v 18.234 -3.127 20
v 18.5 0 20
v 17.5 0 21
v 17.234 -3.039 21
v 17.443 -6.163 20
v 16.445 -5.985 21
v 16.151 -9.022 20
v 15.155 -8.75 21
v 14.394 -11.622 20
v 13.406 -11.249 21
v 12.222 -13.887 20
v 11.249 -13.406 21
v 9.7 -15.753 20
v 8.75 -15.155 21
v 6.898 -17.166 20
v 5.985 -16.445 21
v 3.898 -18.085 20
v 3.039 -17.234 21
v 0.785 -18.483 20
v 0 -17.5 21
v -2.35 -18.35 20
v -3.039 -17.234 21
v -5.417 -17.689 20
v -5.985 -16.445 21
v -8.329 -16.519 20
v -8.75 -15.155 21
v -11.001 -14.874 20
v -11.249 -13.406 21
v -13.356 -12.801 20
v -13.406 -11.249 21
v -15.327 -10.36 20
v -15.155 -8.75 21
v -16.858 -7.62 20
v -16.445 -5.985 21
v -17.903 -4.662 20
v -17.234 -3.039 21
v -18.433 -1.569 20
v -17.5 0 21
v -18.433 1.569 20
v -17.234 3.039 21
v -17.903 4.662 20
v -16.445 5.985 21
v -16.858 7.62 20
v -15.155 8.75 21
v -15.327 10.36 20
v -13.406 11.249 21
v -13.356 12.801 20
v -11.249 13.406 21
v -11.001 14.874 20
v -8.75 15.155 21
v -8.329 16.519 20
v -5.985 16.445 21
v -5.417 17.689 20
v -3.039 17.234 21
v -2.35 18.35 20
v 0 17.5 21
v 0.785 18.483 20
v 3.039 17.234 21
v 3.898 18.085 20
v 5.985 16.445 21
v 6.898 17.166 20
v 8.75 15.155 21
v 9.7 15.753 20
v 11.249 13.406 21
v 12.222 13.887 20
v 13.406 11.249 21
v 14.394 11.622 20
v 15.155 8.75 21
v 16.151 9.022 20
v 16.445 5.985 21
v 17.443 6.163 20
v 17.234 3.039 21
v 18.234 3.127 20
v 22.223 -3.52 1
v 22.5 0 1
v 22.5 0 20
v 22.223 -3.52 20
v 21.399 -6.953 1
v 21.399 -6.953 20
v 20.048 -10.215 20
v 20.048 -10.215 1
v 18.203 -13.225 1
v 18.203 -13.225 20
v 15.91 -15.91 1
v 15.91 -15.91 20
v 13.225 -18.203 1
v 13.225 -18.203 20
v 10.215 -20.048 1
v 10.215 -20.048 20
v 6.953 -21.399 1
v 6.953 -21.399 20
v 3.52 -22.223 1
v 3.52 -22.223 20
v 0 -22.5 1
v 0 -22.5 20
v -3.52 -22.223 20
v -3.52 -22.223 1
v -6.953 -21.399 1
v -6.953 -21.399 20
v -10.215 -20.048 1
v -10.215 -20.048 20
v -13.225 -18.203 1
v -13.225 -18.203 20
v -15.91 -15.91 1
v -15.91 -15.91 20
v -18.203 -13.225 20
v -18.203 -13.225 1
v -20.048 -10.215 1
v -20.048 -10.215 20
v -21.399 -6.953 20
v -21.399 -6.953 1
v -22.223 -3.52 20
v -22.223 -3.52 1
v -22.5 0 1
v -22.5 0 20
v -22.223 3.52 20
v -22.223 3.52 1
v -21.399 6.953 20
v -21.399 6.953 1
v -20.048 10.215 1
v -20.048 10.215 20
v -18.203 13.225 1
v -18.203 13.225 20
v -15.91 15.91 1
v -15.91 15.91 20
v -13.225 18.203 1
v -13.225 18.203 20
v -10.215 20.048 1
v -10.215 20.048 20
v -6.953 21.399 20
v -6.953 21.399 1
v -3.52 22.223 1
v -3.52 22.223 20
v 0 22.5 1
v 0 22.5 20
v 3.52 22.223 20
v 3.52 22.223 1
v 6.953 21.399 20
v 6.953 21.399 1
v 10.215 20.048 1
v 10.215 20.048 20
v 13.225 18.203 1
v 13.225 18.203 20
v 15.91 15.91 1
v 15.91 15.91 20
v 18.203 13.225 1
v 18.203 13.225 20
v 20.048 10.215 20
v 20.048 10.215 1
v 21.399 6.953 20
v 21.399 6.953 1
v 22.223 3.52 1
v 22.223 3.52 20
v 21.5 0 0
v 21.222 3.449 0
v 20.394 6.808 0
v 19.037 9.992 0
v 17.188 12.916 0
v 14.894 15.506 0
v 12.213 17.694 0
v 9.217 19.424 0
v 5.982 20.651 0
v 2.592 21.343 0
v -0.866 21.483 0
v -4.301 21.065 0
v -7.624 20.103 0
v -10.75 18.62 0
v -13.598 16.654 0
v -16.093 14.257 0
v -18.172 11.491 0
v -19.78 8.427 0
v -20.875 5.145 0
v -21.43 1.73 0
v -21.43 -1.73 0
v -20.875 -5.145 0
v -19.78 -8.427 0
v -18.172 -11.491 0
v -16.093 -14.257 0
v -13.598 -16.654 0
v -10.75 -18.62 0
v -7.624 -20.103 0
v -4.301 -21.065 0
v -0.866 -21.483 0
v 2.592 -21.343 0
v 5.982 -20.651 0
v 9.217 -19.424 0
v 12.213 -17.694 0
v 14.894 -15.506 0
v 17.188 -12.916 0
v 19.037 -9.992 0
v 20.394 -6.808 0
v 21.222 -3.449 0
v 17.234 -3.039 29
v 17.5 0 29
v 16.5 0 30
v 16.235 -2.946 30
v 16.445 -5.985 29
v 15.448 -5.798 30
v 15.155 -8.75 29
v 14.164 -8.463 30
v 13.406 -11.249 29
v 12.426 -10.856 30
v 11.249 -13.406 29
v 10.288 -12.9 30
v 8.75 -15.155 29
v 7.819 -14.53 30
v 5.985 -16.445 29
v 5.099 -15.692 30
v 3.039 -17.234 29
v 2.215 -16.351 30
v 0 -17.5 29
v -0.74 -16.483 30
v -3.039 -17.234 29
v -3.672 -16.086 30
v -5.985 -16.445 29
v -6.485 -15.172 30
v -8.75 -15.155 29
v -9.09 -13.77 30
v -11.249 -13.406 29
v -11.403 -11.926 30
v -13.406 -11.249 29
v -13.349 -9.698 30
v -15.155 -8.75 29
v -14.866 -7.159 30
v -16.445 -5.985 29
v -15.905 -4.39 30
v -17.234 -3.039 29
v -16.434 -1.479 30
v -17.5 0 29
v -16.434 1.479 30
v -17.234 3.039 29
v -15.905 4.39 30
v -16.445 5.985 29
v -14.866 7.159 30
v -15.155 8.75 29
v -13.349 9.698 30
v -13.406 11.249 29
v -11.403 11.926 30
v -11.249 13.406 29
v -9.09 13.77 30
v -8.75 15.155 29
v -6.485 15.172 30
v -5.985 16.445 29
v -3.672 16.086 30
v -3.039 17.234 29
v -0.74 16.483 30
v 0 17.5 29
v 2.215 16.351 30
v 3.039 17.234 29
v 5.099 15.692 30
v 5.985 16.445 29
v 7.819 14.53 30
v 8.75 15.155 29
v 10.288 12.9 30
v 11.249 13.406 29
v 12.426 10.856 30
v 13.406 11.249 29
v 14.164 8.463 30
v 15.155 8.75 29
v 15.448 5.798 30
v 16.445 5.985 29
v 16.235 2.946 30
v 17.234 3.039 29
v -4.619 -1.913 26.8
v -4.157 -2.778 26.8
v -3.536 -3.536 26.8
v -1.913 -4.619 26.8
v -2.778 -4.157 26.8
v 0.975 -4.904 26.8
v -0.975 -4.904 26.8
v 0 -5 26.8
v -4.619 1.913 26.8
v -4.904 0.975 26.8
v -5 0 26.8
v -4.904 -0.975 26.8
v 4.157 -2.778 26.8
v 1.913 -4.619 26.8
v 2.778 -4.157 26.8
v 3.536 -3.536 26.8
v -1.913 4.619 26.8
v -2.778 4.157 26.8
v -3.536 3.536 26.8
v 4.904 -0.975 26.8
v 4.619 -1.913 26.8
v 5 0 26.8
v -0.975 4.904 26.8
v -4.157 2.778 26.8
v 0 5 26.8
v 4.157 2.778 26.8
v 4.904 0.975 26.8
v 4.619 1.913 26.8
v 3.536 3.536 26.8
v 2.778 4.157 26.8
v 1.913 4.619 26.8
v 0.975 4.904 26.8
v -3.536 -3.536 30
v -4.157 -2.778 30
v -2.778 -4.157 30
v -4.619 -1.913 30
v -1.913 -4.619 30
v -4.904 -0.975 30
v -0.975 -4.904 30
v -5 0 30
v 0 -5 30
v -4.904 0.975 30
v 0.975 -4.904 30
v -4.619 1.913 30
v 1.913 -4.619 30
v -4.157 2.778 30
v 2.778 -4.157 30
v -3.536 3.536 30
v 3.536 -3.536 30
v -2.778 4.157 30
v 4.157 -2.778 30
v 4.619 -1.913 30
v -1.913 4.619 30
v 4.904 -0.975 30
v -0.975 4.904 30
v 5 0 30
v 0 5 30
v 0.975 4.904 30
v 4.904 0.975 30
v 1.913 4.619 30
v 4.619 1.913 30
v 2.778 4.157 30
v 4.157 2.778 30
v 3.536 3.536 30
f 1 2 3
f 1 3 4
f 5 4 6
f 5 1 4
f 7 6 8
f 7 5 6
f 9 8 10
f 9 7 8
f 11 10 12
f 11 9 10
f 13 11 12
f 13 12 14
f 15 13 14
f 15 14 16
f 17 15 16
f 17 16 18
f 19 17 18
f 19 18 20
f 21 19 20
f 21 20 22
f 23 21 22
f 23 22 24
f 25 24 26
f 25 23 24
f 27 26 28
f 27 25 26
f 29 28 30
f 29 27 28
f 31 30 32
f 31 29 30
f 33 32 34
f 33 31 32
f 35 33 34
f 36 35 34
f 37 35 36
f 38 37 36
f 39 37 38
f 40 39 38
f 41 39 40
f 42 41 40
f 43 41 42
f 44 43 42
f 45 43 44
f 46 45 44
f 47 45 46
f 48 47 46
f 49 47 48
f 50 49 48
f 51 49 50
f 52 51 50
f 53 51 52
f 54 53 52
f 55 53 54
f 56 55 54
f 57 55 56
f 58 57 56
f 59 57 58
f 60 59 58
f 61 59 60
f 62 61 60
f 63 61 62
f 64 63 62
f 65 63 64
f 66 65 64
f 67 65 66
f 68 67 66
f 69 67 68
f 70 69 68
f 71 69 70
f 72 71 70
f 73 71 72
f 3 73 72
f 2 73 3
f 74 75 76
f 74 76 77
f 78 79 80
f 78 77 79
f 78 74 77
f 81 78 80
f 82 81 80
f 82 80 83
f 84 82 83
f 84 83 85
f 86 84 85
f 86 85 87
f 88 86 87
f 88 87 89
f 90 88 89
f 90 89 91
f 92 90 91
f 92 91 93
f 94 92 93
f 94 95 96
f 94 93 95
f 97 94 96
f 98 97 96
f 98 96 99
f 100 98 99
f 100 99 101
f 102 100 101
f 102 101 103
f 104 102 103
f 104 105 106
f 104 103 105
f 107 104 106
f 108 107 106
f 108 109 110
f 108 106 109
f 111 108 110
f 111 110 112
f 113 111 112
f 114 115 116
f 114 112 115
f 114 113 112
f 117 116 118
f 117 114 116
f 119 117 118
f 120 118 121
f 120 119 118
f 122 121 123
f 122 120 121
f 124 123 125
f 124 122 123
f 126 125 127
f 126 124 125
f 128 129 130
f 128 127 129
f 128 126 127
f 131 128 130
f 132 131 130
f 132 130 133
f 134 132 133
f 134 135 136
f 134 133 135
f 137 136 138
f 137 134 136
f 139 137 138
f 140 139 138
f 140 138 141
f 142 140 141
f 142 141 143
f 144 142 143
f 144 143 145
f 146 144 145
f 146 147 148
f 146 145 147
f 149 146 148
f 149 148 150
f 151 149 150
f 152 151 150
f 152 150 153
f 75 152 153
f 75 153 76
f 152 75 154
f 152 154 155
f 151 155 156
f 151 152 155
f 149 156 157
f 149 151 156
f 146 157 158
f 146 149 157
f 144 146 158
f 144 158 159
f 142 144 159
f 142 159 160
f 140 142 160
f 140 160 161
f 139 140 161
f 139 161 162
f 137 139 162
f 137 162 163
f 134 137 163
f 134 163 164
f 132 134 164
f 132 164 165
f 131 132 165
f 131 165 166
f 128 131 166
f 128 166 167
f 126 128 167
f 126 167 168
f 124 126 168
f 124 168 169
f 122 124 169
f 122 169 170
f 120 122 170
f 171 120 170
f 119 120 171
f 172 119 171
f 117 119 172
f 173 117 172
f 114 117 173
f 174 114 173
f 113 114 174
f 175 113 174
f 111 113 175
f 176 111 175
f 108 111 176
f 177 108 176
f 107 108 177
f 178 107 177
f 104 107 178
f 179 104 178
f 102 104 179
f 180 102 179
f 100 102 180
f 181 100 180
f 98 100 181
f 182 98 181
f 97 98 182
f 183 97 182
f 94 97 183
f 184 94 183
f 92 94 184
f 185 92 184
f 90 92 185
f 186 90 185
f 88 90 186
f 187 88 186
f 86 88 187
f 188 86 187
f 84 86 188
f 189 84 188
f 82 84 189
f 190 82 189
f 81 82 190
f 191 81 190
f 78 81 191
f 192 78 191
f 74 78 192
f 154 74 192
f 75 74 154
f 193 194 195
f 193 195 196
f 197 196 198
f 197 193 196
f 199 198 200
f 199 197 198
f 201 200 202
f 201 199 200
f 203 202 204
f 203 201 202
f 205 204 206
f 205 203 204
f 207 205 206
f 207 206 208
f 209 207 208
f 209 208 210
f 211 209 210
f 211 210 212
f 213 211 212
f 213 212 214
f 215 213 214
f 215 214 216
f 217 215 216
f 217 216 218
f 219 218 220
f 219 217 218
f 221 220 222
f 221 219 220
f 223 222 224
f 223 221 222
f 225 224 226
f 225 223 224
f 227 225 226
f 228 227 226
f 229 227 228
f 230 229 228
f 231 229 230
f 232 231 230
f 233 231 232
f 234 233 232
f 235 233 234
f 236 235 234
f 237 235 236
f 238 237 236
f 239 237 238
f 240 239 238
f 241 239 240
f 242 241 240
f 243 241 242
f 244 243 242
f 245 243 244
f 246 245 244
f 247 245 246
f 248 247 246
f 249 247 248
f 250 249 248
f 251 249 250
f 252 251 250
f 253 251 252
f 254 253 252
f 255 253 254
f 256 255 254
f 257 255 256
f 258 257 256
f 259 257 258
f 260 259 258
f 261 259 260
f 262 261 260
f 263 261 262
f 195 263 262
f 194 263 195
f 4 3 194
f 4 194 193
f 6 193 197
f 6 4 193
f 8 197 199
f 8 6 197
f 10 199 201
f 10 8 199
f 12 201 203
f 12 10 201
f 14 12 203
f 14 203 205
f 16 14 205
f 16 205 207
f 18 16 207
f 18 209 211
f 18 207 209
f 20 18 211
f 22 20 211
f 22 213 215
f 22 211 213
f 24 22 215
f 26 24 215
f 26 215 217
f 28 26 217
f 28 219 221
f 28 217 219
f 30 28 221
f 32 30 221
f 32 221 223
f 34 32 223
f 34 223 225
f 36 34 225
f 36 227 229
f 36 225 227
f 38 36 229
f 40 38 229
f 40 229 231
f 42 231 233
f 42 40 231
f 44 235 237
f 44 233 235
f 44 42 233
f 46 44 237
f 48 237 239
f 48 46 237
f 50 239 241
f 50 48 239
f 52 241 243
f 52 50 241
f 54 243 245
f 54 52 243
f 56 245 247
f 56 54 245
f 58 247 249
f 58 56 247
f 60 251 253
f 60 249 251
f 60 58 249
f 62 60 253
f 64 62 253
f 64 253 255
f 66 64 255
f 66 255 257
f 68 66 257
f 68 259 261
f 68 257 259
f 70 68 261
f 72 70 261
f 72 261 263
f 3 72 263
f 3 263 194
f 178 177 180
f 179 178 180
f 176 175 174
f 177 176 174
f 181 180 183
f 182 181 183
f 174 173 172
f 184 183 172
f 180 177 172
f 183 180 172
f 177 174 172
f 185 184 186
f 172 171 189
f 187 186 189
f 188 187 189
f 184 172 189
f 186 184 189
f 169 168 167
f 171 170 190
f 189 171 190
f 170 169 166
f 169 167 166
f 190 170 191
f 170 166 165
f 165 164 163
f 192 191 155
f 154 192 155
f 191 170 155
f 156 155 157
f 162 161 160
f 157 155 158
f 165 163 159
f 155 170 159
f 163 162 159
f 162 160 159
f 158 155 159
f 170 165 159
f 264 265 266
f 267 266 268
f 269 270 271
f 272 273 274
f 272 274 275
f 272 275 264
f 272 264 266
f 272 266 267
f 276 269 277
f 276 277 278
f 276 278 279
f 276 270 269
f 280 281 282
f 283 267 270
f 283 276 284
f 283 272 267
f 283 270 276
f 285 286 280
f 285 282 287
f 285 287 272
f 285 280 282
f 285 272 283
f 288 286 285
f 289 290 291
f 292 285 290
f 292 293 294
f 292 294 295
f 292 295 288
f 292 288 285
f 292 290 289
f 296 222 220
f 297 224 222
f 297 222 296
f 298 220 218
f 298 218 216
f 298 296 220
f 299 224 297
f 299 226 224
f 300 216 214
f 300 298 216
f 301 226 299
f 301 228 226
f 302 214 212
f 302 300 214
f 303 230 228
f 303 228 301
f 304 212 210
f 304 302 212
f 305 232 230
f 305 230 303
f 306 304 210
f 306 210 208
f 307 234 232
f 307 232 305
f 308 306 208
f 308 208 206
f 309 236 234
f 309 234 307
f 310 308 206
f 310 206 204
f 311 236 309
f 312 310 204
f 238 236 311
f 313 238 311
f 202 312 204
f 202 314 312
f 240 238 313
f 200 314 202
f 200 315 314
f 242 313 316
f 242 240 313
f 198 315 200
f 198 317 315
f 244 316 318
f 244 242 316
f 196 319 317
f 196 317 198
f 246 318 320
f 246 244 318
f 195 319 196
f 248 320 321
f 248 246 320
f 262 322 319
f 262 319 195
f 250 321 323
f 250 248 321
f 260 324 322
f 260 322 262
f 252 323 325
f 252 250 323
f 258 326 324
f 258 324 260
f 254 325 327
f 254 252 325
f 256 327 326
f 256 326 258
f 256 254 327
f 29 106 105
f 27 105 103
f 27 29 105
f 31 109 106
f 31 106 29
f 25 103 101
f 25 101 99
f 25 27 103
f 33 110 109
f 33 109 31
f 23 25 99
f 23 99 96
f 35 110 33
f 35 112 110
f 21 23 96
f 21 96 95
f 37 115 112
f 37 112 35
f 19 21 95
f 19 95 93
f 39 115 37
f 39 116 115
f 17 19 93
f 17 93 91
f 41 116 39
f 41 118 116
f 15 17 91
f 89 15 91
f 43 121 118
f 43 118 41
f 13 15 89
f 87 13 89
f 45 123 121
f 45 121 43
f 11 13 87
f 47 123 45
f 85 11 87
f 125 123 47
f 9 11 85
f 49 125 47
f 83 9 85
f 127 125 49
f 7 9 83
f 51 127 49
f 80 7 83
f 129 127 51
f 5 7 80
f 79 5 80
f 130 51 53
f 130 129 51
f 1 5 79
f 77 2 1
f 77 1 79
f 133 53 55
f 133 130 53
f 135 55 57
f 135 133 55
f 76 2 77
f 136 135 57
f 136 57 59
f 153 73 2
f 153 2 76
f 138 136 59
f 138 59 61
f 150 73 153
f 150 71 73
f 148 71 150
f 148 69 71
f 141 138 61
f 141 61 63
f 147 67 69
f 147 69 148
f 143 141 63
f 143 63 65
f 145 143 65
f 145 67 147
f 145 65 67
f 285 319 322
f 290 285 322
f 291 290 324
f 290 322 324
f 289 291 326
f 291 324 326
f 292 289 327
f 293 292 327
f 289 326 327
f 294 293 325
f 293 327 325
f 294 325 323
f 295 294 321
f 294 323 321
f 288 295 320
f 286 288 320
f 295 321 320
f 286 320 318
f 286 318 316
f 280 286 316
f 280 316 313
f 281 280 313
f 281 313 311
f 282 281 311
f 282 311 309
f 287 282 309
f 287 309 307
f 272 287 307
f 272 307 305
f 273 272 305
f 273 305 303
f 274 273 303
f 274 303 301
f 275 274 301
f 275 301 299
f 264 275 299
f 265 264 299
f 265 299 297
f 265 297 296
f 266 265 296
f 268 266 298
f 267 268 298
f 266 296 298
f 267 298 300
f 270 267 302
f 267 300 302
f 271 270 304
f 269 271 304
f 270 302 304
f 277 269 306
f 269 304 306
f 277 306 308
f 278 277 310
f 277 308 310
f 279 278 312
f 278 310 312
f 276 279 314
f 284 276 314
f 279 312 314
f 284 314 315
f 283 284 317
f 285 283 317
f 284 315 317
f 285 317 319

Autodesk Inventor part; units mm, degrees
ref_plane "YZ Plane" through (0, 0, 0) normal (1, 0, 0) x (0, 1, 0)
ref_plane "XZ Plane" through (0, 0, 0) normal (0, 1, 0) x (-1, 0, 0)
ref_plane "XY Plane" through (0, 0, 0) normal (0, 0, 1) x (1, 0, 0)
sketch "Sketch1" plane through (0, 0, 0) normal (0, 0, 1) x (1, 0, 0)
  circle A0 centre (0, 0) radius 22.5
  dimension "d0" = 45
extrude "Extrusion1" add sketch "Sketch1" along normal blind 20
sketch "Sketch2" plane through (0, 0, 20) normal (0, 0, 1) x (1, 0, 0)
  circle A0 centre (0, 0) radius 17.5
  dimension "d3" = 35
extrude "Extrusion2" add sketch "Sketch2" along normal blind 10
chamfer "Chamfer1" distance 1 angle 45 1 edges at (-17.5, 0, 20)
chamfer "Chamfer2" distance 1 angle 45 1 edges at (-17.5, 0, 30)
chamfer "Chamfer3" distance 1 angle 45 1 edges at (-22.5, 0, 0)
sketch "Sketch3" plane through (0, 0, 30) normal (0, 0, 1) x (1, 0, 0)
  circle A0 centre (0, 0) radius 5
  dimension "d15" = 10
extrude "Extrusion3" cut sketch "Sketch3" against normal blind 3.2
